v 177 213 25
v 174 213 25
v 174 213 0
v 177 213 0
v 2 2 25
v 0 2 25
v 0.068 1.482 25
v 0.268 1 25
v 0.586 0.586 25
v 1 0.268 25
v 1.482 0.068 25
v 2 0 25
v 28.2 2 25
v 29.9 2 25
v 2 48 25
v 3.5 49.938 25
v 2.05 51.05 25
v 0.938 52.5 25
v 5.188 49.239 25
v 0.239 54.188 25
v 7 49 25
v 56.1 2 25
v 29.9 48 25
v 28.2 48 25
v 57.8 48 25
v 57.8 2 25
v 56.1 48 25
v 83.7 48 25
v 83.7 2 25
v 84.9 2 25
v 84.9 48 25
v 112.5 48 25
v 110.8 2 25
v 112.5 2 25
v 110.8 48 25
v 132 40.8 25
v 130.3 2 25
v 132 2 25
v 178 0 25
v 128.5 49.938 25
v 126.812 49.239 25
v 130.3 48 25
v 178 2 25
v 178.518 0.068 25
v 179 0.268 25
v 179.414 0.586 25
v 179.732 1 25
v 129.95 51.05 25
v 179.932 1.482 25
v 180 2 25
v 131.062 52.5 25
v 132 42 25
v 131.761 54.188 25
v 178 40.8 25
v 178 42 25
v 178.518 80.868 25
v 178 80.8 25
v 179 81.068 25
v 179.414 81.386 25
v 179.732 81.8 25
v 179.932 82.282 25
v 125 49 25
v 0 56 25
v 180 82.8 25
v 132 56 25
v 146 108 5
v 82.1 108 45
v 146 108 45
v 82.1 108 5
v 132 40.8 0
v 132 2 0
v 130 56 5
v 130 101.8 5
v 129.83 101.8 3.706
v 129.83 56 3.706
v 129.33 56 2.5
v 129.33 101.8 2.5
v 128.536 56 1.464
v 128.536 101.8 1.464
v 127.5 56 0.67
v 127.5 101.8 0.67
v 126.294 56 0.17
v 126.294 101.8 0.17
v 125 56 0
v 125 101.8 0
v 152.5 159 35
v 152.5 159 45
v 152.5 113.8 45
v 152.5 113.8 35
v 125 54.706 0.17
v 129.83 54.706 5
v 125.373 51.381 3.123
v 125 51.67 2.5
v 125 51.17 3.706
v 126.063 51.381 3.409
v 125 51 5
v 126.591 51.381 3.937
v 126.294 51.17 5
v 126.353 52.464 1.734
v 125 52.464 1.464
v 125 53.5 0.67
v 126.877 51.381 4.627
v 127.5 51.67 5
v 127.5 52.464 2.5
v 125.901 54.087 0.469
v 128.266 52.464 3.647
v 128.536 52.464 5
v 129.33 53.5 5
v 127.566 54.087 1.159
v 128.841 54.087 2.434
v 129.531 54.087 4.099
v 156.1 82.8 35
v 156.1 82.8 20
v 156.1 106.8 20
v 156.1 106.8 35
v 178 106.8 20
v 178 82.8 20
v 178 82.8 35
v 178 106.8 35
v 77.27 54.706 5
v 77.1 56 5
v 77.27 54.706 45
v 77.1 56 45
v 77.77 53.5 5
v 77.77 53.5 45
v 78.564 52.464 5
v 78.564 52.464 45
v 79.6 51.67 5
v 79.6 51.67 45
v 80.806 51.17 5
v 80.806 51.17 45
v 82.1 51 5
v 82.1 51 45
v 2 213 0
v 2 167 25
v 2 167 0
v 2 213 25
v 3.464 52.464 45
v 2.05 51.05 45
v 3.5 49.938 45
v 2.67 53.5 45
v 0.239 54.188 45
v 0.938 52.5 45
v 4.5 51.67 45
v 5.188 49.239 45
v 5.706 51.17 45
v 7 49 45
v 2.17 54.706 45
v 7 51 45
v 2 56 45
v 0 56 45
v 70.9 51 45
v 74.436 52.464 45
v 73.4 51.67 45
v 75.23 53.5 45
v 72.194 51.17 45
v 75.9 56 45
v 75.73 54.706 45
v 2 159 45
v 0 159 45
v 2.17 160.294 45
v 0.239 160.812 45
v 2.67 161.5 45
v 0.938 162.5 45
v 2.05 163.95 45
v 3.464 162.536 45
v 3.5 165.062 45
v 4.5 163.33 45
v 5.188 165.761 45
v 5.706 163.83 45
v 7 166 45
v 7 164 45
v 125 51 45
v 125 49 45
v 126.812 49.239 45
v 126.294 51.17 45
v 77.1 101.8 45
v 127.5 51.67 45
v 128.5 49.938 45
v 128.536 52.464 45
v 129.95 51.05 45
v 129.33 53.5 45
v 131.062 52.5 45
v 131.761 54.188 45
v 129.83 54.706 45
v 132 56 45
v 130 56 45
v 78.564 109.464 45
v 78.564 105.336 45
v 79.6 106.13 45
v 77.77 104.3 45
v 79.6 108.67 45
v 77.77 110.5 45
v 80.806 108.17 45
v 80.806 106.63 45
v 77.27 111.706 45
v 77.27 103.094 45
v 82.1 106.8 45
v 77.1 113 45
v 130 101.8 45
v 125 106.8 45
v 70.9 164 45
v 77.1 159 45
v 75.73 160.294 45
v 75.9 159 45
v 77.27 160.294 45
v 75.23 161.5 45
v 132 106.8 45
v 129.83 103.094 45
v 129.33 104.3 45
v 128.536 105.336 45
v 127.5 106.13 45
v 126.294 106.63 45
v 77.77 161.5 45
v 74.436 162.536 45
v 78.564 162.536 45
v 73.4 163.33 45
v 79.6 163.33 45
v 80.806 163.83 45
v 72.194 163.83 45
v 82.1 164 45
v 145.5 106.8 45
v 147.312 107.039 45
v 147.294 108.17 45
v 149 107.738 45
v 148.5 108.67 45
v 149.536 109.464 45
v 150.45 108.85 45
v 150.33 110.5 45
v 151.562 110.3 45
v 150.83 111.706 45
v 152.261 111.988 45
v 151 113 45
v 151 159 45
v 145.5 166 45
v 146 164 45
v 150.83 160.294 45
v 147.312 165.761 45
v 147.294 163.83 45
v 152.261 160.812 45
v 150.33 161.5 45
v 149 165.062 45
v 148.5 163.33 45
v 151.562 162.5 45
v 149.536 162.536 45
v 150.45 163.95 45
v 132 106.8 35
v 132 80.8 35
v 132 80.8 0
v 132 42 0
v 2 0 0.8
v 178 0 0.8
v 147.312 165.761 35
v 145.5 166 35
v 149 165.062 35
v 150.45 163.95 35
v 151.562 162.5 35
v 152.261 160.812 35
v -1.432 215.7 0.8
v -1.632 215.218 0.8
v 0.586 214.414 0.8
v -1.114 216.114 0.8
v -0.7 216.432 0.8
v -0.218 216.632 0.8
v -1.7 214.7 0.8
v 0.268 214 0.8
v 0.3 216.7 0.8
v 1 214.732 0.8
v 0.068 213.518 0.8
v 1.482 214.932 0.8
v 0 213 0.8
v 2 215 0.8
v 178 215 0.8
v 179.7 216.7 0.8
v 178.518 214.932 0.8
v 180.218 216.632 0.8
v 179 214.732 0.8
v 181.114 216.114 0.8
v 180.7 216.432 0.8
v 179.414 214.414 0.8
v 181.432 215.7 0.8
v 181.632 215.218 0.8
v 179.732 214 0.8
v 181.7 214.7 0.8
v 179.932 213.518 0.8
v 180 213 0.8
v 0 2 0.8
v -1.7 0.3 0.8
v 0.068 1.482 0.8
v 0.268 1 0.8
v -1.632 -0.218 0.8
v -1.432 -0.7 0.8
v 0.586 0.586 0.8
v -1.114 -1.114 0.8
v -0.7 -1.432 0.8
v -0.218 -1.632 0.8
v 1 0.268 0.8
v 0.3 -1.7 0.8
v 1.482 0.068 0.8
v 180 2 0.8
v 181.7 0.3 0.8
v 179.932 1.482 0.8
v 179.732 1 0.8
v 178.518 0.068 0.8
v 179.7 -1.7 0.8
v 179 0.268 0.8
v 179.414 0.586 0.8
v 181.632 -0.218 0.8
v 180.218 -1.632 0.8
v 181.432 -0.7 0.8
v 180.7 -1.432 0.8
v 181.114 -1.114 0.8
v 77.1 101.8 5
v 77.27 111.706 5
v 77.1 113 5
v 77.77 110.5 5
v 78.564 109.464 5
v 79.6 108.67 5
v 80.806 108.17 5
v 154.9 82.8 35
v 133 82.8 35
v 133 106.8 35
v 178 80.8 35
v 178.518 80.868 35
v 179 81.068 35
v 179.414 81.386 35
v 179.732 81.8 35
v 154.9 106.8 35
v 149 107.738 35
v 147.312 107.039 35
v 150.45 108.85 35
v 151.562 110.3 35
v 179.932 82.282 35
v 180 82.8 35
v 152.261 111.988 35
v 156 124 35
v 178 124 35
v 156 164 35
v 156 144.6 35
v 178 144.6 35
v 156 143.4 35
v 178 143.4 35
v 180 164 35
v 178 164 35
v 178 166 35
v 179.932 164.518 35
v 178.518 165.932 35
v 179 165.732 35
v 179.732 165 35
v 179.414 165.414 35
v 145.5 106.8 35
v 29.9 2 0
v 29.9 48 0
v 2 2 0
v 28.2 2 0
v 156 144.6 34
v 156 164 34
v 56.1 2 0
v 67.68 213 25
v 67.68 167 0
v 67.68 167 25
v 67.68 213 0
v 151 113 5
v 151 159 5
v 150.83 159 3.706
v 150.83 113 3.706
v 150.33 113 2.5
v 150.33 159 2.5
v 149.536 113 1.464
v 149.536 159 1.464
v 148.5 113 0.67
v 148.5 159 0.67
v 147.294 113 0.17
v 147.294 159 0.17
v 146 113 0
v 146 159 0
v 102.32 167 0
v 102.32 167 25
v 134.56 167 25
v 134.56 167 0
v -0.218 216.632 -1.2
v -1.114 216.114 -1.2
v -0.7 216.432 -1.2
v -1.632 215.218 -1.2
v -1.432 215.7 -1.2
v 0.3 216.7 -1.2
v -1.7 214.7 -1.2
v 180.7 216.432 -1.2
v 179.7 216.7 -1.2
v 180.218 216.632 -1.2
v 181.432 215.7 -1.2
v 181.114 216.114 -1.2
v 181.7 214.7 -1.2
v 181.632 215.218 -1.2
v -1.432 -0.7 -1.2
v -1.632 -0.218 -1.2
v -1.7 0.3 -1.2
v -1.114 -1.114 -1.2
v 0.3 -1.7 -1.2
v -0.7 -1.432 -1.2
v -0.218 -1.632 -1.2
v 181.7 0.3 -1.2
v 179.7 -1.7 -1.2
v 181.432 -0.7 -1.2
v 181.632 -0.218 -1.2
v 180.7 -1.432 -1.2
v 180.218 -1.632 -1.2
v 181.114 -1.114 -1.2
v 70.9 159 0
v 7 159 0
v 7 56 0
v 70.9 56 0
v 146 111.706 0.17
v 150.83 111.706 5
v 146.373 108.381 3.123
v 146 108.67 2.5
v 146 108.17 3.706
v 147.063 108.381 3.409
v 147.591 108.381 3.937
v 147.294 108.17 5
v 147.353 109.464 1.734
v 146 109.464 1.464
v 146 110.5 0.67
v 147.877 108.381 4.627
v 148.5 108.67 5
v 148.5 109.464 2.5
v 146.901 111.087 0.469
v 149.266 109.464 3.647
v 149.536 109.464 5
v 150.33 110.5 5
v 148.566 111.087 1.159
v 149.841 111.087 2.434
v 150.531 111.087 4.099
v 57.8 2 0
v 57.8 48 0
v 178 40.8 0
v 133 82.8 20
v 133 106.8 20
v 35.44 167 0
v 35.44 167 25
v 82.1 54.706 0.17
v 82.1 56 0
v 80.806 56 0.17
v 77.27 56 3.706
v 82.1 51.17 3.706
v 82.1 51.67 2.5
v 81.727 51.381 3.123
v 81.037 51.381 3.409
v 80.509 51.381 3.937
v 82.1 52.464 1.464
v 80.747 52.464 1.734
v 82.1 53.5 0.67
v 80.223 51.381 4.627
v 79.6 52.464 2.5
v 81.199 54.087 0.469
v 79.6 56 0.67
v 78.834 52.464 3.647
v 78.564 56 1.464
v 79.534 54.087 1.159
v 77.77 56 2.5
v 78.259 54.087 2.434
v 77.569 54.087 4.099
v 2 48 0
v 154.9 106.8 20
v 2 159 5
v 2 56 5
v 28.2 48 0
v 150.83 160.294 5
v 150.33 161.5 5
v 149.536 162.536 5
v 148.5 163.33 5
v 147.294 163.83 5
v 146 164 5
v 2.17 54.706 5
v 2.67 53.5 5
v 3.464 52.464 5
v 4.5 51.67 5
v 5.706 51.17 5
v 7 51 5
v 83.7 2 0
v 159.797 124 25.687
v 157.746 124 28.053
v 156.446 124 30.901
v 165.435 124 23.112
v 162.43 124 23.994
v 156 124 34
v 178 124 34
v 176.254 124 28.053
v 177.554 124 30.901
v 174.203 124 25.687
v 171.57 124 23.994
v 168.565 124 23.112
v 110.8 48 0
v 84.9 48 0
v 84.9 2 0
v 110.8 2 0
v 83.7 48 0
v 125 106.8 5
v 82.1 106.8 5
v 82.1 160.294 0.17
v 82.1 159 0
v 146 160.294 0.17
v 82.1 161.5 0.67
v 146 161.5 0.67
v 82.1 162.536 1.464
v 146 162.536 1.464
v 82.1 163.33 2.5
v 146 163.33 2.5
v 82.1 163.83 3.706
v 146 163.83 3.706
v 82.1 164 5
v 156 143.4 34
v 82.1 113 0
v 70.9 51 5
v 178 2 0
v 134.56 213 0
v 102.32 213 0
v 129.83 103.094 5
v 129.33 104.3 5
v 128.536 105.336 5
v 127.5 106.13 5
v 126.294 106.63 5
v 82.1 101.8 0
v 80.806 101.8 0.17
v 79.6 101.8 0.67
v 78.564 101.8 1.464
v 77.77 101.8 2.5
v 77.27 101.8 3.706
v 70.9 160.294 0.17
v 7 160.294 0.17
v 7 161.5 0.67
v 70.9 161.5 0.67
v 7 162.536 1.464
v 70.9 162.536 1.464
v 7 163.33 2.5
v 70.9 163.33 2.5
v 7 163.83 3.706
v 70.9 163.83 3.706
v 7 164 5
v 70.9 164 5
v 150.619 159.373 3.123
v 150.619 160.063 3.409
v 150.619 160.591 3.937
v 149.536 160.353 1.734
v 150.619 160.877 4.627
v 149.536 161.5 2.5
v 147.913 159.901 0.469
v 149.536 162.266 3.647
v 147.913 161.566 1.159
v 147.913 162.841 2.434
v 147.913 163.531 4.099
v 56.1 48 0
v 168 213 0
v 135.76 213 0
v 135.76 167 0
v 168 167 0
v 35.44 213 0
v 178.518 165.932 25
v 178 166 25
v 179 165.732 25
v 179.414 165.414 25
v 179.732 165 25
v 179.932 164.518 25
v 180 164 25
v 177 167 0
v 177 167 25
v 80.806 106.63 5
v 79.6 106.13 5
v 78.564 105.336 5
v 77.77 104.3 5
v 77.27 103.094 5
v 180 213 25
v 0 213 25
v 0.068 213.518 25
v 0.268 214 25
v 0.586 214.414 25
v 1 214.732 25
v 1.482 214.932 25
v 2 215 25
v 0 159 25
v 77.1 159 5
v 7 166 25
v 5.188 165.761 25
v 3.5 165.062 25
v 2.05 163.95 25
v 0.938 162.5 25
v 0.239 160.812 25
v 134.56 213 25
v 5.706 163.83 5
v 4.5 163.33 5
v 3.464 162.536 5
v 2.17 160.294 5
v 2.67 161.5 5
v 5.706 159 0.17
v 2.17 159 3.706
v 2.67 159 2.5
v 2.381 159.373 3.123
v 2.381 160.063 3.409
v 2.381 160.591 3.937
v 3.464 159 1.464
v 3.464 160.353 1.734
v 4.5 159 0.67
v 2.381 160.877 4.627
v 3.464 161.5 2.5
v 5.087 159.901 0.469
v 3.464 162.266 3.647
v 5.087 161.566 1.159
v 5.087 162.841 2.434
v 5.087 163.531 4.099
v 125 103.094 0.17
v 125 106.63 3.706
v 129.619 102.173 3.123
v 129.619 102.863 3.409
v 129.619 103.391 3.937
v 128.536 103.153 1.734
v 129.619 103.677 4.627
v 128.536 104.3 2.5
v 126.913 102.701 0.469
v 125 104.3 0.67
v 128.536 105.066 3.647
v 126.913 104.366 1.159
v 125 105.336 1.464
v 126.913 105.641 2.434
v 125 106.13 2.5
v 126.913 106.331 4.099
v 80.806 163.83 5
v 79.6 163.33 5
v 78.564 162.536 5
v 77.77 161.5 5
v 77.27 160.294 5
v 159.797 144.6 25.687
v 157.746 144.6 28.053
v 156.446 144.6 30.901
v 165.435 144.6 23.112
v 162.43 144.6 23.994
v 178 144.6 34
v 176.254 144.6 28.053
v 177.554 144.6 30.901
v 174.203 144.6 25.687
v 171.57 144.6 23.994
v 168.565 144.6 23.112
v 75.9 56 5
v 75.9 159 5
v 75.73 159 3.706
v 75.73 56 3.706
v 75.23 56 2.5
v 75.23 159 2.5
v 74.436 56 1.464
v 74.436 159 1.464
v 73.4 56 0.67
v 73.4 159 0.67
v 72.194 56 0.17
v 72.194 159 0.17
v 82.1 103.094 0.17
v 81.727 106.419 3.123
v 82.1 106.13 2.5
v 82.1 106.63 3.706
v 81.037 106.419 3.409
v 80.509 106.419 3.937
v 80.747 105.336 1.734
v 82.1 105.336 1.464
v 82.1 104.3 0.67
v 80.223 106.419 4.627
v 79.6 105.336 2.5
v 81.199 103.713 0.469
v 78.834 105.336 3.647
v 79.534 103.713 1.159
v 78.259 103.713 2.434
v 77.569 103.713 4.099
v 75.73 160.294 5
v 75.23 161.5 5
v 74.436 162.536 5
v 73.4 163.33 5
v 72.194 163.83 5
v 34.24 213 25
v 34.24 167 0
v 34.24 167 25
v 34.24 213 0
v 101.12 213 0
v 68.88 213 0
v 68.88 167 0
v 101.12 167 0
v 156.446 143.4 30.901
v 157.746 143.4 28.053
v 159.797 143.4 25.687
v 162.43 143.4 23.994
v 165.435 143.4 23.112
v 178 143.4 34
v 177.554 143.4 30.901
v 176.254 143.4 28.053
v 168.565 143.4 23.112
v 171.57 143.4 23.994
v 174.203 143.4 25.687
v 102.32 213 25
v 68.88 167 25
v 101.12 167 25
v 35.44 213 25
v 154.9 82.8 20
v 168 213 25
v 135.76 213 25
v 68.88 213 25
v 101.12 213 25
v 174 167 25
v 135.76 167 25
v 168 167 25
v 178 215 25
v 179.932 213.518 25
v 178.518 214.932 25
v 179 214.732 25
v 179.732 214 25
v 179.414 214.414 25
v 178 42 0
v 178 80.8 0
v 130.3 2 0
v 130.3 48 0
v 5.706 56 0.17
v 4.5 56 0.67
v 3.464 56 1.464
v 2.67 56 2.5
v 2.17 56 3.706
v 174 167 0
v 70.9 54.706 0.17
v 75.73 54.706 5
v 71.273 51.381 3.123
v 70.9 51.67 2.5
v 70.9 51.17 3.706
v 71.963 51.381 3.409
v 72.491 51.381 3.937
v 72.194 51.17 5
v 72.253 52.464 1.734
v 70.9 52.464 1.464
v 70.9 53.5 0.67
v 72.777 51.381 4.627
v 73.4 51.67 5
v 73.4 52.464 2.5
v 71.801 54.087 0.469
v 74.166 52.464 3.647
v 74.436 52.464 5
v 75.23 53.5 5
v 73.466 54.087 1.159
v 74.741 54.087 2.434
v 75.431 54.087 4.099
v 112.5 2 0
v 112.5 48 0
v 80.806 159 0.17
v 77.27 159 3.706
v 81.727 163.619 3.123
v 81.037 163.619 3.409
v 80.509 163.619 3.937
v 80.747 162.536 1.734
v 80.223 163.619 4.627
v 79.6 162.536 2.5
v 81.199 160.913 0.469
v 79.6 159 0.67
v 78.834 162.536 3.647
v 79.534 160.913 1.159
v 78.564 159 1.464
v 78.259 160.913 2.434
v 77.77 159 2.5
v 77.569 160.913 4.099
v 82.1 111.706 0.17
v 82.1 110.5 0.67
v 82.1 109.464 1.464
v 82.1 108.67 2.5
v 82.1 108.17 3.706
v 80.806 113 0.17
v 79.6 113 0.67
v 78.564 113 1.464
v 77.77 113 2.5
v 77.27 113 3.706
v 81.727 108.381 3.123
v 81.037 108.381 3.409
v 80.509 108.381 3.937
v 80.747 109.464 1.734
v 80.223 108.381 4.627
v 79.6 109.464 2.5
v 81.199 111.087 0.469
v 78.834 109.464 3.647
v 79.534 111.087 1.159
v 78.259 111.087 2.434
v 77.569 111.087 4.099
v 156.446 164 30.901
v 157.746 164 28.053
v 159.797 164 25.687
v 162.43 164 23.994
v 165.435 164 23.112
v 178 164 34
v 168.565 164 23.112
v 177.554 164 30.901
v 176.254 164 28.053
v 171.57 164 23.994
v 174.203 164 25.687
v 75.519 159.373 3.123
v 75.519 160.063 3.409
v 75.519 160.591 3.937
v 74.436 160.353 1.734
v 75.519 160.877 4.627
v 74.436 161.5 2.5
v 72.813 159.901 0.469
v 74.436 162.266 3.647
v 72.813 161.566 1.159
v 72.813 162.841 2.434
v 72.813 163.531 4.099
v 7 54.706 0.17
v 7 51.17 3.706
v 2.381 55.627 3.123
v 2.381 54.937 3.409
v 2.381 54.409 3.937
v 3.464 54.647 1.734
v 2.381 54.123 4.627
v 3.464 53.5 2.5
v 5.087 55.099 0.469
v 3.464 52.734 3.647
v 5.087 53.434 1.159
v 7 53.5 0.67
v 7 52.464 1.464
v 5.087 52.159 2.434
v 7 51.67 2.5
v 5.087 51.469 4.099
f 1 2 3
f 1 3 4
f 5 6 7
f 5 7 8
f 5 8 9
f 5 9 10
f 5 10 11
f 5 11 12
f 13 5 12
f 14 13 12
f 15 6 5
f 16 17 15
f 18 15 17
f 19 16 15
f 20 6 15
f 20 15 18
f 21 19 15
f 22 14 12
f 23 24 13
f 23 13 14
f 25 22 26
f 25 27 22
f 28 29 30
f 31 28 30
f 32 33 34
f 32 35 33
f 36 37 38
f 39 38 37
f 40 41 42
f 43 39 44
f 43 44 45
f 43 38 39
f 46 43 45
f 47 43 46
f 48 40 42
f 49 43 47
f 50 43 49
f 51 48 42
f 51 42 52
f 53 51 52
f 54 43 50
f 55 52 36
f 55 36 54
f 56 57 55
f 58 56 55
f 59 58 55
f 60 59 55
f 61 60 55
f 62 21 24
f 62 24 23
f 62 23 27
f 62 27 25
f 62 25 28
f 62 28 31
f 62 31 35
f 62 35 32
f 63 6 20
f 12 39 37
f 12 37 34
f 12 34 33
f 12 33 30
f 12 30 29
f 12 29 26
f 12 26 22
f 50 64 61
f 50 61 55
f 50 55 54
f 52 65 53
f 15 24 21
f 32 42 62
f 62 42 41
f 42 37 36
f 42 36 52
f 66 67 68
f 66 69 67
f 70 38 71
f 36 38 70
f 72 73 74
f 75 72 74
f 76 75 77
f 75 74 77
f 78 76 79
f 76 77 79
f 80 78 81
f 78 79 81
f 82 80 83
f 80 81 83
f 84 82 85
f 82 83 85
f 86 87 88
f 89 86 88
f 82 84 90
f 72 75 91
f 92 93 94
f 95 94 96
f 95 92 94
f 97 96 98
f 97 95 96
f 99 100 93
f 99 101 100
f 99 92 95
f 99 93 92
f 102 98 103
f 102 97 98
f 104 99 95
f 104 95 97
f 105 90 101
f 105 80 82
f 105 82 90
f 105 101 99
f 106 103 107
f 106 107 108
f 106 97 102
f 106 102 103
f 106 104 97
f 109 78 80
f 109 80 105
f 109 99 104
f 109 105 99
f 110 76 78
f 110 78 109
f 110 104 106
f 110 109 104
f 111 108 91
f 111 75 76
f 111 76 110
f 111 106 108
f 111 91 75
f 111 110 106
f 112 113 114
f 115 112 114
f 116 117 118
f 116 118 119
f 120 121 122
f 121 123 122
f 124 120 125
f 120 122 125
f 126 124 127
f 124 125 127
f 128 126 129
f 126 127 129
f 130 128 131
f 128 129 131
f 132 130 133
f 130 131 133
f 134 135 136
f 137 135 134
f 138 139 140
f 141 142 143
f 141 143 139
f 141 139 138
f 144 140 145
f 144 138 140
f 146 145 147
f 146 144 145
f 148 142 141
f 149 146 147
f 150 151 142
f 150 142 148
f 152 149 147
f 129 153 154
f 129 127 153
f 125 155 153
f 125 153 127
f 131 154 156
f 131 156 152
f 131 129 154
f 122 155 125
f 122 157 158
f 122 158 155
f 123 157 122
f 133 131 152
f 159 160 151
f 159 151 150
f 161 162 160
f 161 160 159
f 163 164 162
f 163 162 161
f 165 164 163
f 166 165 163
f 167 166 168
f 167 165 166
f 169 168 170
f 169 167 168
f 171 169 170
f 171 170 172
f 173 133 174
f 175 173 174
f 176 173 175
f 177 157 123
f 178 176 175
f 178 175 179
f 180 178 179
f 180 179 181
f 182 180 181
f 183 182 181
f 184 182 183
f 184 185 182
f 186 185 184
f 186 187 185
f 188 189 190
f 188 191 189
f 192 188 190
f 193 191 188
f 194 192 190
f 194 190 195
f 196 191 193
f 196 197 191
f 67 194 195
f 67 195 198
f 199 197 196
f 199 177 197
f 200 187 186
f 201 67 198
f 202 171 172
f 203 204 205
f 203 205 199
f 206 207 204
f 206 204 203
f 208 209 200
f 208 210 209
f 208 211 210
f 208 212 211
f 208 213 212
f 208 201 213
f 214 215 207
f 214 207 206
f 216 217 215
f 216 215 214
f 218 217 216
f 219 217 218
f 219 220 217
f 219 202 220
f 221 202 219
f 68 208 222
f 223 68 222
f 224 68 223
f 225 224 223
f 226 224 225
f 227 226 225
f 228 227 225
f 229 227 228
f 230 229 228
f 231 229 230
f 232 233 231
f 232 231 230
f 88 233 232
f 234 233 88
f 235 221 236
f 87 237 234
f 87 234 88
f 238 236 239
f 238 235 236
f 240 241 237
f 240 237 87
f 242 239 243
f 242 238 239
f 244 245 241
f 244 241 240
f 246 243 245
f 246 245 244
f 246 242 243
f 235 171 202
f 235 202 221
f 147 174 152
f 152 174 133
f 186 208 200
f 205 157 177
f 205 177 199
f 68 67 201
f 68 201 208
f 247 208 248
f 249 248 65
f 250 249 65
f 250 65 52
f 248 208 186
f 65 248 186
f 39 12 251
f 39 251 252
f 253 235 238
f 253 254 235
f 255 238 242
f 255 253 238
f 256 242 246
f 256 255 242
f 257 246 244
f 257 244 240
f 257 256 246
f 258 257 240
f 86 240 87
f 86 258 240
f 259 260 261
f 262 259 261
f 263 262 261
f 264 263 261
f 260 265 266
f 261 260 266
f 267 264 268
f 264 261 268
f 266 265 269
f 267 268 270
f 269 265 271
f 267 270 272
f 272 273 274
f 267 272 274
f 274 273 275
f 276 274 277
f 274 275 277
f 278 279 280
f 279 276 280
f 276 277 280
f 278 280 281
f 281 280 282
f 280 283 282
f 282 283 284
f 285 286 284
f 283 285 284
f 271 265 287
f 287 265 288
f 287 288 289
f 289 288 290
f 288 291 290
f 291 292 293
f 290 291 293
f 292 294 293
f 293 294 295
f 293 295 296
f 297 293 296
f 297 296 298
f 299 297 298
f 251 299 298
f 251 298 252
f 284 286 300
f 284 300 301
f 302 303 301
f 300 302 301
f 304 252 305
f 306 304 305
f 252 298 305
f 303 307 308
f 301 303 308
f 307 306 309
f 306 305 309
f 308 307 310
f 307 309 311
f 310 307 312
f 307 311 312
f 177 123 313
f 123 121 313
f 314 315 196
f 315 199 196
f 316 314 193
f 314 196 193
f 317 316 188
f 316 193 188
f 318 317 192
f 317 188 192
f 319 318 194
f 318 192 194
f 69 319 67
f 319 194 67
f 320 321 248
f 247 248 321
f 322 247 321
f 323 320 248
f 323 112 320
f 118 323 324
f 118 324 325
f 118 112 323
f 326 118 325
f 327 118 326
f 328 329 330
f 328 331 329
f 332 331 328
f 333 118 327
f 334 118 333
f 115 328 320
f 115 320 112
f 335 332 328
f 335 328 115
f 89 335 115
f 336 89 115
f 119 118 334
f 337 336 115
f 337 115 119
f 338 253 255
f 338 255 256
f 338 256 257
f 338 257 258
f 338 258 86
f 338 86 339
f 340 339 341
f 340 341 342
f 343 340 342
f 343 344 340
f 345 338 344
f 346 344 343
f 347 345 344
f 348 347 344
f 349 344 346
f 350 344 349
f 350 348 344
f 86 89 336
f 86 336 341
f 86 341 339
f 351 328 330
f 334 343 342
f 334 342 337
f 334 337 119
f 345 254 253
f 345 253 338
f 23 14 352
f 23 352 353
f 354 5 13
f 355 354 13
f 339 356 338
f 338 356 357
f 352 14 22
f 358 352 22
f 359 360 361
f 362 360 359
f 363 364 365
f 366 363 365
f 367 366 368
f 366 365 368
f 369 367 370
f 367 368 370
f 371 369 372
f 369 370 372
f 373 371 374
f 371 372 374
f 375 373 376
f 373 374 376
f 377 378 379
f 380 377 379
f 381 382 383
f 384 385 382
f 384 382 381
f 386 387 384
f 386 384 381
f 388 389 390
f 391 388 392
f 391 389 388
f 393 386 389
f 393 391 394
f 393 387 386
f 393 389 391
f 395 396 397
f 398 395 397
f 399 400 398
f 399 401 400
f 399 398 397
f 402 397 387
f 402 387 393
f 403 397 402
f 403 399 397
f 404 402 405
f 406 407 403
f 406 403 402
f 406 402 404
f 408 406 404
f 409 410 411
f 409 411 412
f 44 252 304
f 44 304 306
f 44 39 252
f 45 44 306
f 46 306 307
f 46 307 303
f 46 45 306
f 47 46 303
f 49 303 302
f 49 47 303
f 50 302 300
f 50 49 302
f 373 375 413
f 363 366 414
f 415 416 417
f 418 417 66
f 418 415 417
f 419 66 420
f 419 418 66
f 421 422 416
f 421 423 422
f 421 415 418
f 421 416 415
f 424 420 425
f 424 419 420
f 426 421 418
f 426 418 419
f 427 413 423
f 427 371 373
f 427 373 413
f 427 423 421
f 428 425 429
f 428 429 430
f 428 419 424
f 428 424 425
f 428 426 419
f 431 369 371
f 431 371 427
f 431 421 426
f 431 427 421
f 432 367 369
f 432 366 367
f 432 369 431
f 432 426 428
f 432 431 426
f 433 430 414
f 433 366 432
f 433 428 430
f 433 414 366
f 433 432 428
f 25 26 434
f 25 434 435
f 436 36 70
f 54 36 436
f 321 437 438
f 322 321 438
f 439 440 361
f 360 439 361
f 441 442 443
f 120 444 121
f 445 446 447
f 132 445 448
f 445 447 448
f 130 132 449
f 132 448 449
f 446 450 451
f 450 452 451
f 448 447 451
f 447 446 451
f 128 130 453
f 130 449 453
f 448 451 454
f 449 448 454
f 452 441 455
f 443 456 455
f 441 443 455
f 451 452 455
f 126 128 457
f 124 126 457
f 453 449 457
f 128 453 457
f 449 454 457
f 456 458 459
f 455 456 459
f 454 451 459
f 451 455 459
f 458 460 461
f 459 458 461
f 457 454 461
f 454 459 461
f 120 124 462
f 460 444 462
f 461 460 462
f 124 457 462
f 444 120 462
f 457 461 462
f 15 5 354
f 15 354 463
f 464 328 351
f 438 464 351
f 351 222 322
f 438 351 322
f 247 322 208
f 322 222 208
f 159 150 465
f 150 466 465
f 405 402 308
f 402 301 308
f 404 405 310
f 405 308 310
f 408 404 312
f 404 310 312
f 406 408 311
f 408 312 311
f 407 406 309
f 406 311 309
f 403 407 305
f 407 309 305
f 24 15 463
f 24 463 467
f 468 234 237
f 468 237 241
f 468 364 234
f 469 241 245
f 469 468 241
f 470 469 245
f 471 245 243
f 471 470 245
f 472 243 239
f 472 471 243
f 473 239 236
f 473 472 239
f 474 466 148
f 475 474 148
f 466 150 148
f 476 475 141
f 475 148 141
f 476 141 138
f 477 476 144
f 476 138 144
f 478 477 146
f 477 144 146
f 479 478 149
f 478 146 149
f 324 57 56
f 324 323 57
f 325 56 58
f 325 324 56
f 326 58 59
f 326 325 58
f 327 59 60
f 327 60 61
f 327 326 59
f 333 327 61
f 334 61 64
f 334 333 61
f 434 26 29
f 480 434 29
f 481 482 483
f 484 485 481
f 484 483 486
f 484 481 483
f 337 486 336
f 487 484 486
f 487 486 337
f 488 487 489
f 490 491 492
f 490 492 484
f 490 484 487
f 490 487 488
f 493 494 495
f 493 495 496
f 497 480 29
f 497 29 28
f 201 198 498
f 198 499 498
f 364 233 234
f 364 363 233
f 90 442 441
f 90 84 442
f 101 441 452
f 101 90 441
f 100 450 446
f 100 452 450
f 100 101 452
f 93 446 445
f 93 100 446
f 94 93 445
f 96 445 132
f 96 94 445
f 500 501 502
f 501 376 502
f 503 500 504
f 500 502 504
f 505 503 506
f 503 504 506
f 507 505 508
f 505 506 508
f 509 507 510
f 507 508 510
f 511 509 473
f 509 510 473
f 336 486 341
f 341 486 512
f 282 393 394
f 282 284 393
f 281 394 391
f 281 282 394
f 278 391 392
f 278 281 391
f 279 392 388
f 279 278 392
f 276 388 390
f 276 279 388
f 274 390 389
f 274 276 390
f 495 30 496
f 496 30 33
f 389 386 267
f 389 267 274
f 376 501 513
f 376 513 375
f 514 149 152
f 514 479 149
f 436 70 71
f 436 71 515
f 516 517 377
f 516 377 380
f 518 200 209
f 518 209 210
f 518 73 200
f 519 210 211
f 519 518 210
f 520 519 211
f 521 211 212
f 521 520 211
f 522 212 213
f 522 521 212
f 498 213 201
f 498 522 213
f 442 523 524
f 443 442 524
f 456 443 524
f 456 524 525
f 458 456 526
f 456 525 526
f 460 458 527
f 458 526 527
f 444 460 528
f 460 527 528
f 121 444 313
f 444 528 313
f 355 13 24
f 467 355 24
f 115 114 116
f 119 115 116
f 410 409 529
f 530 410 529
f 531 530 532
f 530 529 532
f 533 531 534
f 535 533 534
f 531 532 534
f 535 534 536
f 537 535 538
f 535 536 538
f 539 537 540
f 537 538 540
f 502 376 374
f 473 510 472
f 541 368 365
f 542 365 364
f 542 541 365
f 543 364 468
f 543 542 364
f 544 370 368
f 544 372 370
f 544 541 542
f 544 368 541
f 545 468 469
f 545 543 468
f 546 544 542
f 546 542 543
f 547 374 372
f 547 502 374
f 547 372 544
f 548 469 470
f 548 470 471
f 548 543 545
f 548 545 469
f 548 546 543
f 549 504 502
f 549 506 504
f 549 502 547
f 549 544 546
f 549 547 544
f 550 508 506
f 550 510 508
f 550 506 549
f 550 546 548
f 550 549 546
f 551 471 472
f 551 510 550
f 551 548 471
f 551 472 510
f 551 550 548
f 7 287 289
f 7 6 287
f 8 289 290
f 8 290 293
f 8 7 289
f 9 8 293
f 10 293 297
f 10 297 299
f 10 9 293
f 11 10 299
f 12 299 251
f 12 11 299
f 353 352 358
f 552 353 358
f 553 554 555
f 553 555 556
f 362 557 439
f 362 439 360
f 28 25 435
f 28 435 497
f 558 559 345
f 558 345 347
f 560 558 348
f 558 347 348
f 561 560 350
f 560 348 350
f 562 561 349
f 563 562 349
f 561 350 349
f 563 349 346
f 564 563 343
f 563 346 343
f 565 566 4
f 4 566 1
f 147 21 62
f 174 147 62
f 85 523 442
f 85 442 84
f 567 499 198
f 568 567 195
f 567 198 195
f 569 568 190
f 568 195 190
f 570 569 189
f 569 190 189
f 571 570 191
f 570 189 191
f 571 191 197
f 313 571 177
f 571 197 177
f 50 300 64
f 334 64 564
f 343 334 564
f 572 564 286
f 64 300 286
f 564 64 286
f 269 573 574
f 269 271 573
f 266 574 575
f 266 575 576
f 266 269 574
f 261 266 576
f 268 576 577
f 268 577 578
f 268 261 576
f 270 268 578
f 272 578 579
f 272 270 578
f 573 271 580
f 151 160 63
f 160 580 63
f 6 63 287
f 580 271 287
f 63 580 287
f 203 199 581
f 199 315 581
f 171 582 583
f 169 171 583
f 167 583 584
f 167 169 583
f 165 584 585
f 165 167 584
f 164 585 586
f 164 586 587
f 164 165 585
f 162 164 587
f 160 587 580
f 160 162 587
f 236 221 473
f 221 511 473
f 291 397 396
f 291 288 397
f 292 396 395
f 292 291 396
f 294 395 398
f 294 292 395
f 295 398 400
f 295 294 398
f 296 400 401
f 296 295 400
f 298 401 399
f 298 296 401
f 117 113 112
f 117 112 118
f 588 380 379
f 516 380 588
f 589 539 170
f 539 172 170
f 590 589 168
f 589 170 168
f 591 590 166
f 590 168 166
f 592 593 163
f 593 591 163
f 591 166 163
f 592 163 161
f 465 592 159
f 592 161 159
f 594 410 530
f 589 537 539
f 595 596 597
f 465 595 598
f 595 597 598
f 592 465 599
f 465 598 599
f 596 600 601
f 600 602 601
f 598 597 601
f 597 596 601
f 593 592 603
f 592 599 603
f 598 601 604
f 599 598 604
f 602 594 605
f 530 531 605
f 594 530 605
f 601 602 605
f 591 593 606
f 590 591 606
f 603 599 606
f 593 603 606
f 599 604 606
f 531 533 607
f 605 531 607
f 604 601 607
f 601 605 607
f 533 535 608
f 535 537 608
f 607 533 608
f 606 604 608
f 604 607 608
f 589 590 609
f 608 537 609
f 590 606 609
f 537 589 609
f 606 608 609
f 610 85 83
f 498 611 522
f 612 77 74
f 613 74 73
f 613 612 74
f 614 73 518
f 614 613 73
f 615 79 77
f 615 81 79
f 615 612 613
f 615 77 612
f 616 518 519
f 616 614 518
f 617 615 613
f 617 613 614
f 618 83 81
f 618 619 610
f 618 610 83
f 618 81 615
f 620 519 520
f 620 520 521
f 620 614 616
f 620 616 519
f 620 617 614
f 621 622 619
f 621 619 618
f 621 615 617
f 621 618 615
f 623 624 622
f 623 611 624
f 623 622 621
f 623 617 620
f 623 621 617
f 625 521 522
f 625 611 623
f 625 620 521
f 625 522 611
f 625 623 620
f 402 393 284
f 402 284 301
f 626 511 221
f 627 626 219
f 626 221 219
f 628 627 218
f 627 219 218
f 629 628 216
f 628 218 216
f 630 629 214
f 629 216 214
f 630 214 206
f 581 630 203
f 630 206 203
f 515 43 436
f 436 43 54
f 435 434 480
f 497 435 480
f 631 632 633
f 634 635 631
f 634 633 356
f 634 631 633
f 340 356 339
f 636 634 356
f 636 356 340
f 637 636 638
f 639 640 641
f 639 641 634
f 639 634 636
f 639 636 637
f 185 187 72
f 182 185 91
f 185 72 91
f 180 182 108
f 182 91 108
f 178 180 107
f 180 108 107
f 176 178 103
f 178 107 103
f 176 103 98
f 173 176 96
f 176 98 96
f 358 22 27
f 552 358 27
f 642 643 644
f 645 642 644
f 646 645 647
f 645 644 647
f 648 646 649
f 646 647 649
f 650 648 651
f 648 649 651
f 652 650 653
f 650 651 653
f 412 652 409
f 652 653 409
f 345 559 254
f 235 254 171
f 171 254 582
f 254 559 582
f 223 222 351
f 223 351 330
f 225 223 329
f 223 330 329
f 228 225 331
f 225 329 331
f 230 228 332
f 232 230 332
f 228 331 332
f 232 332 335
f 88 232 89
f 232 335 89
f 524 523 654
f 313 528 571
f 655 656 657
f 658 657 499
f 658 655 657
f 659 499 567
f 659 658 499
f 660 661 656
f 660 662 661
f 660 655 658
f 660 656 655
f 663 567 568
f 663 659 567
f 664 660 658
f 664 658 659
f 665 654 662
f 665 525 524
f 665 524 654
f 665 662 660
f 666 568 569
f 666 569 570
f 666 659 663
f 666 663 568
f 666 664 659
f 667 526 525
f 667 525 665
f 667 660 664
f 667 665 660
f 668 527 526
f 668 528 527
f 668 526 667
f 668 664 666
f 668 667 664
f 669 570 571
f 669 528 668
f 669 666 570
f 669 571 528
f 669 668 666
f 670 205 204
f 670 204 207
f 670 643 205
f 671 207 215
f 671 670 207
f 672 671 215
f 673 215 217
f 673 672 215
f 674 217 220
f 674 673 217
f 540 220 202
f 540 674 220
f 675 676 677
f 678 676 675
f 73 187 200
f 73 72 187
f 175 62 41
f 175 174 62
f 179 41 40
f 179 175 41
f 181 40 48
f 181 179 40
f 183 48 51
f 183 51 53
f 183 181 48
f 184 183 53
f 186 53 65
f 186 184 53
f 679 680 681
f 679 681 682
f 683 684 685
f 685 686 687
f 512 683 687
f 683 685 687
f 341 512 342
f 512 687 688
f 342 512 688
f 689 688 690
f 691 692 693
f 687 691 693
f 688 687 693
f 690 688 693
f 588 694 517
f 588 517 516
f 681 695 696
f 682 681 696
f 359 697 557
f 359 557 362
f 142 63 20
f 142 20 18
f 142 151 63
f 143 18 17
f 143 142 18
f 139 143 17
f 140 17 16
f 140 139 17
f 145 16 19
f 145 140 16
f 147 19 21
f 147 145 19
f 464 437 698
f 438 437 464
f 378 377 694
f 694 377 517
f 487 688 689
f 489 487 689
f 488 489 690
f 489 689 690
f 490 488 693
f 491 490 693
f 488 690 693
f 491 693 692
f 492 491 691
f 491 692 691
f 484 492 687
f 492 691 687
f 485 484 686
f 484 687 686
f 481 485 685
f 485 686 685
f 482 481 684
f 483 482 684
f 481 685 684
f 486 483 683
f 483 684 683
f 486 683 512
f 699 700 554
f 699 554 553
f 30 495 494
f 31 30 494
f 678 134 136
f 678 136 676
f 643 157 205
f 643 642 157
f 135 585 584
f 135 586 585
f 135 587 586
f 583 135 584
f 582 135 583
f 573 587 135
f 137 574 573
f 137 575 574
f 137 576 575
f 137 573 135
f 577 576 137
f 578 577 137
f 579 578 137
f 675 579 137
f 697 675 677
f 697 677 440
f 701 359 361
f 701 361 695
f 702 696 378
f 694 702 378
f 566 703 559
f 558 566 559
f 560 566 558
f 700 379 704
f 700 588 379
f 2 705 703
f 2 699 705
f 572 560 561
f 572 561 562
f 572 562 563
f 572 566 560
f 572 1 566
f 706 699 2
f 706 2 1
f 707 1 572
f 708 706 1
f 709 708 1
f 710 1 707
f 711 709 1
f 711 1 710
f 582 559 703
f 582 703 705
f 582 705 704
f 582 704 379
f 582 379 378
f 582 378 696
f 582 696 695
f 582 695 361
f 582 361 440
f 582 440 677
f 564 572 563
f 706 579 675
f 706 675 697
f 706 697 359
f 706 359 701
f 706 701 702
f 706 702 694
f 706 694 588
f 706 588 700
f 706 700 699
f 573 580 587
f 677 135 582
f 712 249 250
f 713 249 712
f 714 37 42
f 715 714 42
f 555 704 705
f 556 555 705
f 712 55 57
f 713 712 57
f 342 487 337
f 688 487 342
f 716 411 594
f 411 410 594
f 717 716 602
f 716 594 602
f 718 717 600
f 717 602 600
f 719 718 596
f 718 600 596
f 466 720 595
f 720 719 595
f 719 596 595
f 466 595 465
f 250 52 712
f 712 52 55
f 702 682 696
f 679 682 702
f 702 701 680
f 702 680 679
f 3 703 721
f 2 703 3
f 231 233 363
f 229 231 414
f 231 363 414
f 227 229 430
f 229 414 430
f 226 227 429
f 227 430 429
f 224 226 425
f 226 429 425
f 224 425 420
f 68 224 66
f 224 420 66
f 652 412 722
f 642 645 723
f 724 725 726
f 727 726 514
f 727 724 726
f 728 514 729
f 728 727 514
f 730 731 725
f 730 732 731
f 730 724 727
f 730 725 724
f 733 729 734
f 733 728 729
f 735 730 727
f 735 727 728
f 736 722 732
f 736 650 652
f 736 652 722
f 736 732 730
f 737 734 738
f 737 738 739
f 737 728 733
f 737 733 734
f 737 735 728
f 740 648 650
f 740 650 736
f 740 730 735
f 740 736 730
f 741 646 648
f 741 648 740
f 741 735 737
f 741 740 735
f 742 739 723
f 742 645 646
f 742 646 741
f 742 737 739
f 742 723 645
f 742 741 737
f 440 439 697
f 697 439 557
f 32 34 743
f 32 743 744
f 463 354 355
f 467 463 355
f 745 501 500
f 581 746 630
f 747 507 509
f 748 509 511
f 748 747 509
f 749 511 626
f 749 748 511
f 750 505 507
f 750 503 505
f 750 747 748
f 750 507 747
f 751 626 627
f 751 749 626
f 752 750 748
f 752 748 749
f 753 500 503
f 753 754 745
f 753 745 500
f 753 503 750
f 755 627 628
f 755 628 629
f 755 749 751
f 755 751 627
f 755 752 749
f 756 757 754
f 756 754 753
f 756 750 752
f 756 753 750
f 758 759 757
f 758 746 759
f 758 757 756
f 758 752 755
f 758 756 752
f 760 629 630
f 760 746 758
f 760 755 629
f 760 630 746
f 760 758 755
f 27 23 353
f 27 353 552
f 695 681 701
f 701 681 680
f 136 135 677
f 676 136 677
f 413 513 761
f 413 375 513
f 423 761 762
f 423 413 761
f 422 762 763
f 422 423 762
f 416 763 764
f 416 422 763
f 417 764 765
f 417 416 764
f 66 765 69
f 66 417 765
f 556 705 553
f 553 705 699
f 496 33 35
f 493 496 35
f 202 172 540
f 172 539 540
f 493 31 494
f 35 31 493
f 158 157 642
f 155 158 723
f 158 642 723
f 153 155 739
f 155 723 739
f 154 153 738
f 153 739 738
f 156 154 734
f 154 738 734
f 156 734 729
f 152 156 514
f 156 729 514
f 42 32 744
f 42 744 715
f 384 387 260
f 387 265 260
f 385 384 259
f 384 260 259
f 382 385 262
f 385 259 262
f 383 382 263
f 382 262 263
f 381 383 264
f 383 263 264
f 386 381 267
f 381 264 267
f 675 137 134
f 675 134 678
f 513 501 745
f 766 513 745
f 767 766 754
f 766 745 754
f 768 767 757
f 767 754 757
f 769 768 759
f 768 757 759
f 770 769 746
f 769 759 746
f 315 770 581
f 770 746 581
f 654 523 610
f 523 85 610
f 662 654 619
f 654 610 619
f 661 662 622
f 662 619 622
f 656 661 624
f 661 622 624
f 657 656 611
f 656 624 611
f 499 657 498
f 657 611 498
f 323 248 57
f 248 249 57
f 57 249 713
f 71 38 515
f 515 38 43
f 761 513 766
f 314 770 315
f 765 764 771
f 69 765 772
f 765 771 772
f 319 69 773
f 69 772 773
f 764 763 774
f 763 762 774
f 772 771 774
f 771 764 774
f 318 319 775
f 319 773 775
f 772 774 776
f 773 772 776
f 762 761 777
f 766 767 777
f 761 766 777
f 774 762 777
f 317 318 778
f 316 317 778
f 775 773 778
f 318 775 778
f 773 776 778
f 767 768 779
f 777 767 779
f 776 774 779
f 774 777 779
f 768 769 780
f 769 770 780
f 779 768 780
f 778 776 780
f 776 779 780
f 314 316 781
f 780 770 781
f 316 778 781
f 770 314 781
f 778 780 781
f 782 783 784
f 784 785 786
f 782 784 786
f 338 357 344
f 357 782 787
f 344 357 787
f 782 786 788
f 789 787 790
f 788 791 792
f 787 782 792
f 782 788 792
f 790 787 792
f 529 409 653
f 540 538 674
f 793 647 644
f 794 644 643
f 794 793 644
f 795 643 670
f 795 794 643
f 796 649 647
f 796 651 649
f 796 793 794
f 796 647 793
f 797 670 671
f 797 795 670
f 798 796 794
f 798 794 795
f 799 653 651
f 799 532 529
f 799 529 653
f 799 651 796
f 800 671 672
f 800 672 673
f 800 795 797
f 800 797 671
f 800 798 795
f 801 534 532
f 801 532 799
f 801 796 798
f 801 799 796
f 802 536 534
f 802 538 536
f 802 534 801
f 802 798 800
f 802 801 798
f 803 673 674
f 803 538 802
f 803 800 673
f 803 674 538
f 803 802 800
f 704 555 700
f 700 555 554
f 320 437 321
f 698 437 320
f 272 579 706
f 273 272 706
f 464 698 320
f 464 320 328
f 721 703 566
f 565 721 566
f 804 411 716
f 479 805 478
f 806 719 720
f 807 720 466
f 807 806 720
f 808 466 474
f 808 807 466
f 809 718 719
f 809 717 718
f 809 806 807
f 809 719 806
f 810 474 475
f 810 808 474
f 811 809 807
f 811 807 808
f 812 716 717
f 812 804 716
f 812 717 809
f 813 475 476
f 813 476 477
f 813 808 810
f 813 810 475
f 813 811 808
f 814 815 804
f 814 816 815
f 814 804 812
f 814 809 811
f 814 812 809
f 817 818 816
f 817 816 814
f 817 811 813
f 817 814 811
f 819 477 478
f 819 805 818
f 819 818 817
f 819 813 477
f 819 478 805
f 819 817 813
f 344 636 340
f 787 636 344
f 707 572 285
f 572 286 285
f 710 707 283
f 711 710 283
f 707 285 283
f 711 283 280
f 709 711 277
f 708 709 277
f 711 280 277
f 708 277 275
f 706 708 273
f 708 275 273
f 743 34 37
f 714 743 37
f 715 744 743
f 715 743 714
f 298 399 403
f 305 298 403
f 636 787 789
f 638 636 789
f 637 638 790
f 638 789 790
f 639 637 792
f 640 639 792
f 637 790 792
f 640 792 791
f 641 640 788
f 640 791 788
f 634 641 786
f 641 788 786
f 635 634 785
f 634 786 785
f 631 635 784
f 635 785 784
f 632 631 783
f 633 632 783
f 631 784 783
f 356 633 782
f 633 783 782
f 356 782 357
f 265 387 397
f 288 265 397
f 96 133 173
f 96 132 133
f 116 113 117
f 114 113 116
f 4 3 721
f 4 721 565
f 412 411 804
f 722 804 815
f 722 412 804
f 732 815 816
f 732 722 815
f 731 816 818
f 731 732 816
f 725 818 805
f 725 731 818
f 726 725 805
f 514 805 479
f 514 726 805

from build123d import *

# Parameters (mm, degrees)
F0_W      = 180
F0_H      = 215
F1_DEPTH  = 25
F2_W      = 166
F2_H      = 46
F2_W_2    = 53
F2_W_3    = 26.2
F2_W_4    = 46
F2_H_2    = 38.8
F2_W_5    = 52.9
F2_H_3    = 55.8
F2_W_6    = 45
F2_H_4    = 24
F2_W_7    = 22
F2_H_5    = 40
F2_W_8    = 73.9
F2_H_6    = 56
F2_H_7    = 113
F2_W_9    = 17.8
F2_W_10   = 3
F3_DEPTH  = 25.001
F4_W      = 180
F4_H      = 215
F5_DEPTH  = 1.2
F6_W      = 1.2
F6_H      = 46
F6_W_2    = 22
F6_H_2    = 1.2
F6_H_3    = 24
F7_DEPTH  = 25
F8_W      = 52.9
F8_H      = 55.8
F8_W_2    = 21.9
F8_H_2    = 24
F8_W_3    = 73.9
F8_H_3    = 113
F8_H_4    = 56
F8_W_4    = 22
F8_H_5    = 19.4
F9_DEPTH  = 20
F10_W     = 24
F10_H     = 20
F11_DEPTH = 45
F13_DEPTH = 40
F14_W     = 183.4
F14_H     = 218.4
F14_W_2   = 180
F14_H_2   = 215
F15_DEPTH = 2
F17_DEPTH = 10
F18_R     = 2
F19_R     = 5
F20_R     = 7


with BuildPart() as f1:
    # F0 (on Top) → F1 (new body)
    with BuildSketch(Plane.XY):
        with Locations((90, 107.5)):
            Rectangle(F0_W, F0_H)
    extrude(amount=F1_DEPTH)

    # F2 (on face) → F3 (cut, through all)
    with BuildSketch(Plane.XY.offset(25)):
        with Locations((85, 190)):
            Rectangle(F2_W, F2_H)
        with Locations((84.3, 25)):
            Rectangle(F2_W_2, F2_H)
        with Locations((15.1, 25)):
            Rectangle(F2_W_3, F2_H)
        with Locations((155, 21.4)):
            Rectangle(F2_W_4, F2_H_2)
        with Locations((155, 61.4)):
            Rectangle(F2_W_4, F2_H_2)
        with Locations((43, 25)):
            Rectangle(F2_W_3, F2_H)
        with Locations((103.55, 78.9)):
            Rectangle(F2_W_5, F2_H_3)
        with Locations((155.5, 94.8)):
            Rectangle(F2_W_6, F2_H_4)
        with Locations((167, 144)):
            Rectangle(F2_W_7, F2_H_5)
        with Locations((114.05, 136)):
            Rectangle(F2_W_8, F2_H_6)
        with Locations((38.95, 107.5)):
            Rectangle(F2_W_8, F2_H_7)
        with Locations((121.4, 25)):
            Rectangle(F2_W_9, F2_H)
        with Locations((175.5, 190)):
            Rectangle(F2_W_10, F2_H)
    extrude(amount=-F3_DEPTH, mode=Mode.SUBTRACT)

    # F4 (on Top) → F5 (join)
    with BuildSketch(Plane.XY):
        with Locations((90, 107.5)):
            Rectangle(F4_W, F4_H)
    extrude(amount=-F5_DEPTH)

    # F6 (on Top) → F7 (join, through all)
    with BuildSketch(Plane.XY):
        with Locations((34.84, 190)):
            Rectangle(F6_W, F6_H)
        with Locations((68.28, 190)):
            Rectangle(F6_W, F6_H)
        with Locations((101.72, 190)):
            Rectangle(F6_W, F6_H)
        with Locations((135.16, 190)):
            Rectangle(F6_W, F6_H)
        with Locations((84.3, 25)):
            Rectangle(F6_W, F6_H)
        with Locations((167, 144)):
            Rectangle(F6_W_2, F6_H_2)
        with Locations((155.5, 94.8)):
            Rectangle(F6_W, F6_H_3)
    extrude(amount=F7_DEPTH)

    # F8 (on face) → F9 (join)
    with BuildSketch(Plane.XY.offset(25)):
        Polygon((0, 166), (0, 49), (132, 49), (132, 80.8), (180, 80.8), (180, 166), (132, 166), align=None)
        with Locations((103.55, 78.9)):
            Rectangle(F8_W, F8_H, mode=Mode.SUBTRACT)
        with Locations((143.95, 94.8)):
            Rectangle(F8_W_2, F8_H_2, mode=Mode.SUBTRACT)
        with Locations((167.05, 94.8)):
            Rectangle(F8_W_2, F8_H_2, mode=Mode.SUBTRACT)
        with Locations((38.95, 107.5)):
            Rectangle(F8_W_3, F8_H_3, mode=Mode.SUBTRACT)
        with Locations((114.05, 136)):
            Rectangle(F8_W_3, F8_H_4, mode=Mode.SUBTRACT)
        with Locations((167, 133.7)):
            Rectangle(F8_W_4, F8_H_5, mode=Mode.SUBTRACT)
        with Locations((167, 154.3)):
            Rectangle(F8_W_4, F8_H_5, mode=Mode.SUBTRACT)
    extrude(amount=F9_DEPTH)

    # F10 (on face) → F11 (join, through all)
    with BuildSketch(Plane.YZ.offset(133)):
        with Locations((94.8, 10)):
            Rectangle(F10_W, F10_H)
    extrude(amount=F11_DEPTH)

    # F12 (on face) → F13 (join, through all)
    with BuildSketch(Plane.XZ.offset(-164)):
        with BuildLine():
            Line((156, 34), (156, 0))
            Line((156, 0), (178, 0))
            Line((178, 0), (178, 34))
            ThreePointArc((178, 34), (167, 23), (156, 34))
        make_face()
    extrude(amount=F13_DEPTH)

    # F14 (on face) → F15 (join)
    with BuildSketch(Plane(origin=(0, 0, -1.2), x_dir=(1, 0, 0), z_dir=(0, 0, -1))):
        with Locations((90, -107.5)):
            Rectangle(F14_W, F14_H)
        with Locations((90, -107.5)):
            Rectangle(F14_W_2, F14_H_2, mode=Mode.SUBTRACT)
    extrude(amount=-F15_DEPTH)

    # F16 (on face) → F17 (cut)
    with BuildSketch(Plane.XY.offset(45)):
        Polygon((132, 106.8), (132, 80.8), (180, 80.8), (180, 166), (152.5, 166), (152.5, 106.8), align=None)
    extrude(amount=-F17_DEPTH, mode=Mode.SUBTRACT)

    # F18
    f18_edges = [f1.edges().sort_by_distance(p)[0] for p in [
        (180, 0, 12.9),
        (180, 80.8, 30),
        (180, 166, 30),
        (180, 215, 12.9),
        (0, 215, 12.9),
        (0, 0, 12.9),
        (-1.7, -1.7, -0.2),
        (181.7, -1.7, -0.2),
        (181.7, 216.7, -0.2),
        (-1.7, 216.7, -0.2),
    ]]
    fillet(f18_edges, radius=F18_R)

    # F19
    f19_edges = [f1.edges().sort_by_distance(p)[0] for p in [
        (77.1, 78.9, 0),
        (103.55, 106.8, 0),
        (130, 78.9, 0),
        (103.55, 51, 0),
        (77.1, 136, 0),
        (114.05, 164, 0),
        (151, 136, 0),
        (114.05, 108, 0),
        (38.95, 164, 0),
        (75.9, 107.5, 0),
        (38.95, 51, 0),
        (2, 107.5, 0),
        (2, 51, 22.5),
        (2, 164, 22.5),
        (75.9, 164, 22.5),
        (75.9, 51, 22.5),
        (77.1, 106.8, 22.5),
        (77.1, 164, 22.5),
        (151, 164, 22.5),
        (151, 108, 22.5),
        (130, 106.8, 22.5),
        (130, 51, 22.5),
        (77.1, 51, 22.5),
        (77.1, 108, 22.5),
    ]]
    fillet(f19_edges, radius=F19_R)

    # F20
    f20_edges = [f1.edges().sort_by_distance(p)[0] for p in [
        (132, 49, 35),
        (0, 49, 35),
        (152.5, 106.8, 40),
        (152.5, 166, 40),
        (0, 166, 35),
    ]]
    fillet(f20_edges, radius=F20_R)


solid = f1.part
